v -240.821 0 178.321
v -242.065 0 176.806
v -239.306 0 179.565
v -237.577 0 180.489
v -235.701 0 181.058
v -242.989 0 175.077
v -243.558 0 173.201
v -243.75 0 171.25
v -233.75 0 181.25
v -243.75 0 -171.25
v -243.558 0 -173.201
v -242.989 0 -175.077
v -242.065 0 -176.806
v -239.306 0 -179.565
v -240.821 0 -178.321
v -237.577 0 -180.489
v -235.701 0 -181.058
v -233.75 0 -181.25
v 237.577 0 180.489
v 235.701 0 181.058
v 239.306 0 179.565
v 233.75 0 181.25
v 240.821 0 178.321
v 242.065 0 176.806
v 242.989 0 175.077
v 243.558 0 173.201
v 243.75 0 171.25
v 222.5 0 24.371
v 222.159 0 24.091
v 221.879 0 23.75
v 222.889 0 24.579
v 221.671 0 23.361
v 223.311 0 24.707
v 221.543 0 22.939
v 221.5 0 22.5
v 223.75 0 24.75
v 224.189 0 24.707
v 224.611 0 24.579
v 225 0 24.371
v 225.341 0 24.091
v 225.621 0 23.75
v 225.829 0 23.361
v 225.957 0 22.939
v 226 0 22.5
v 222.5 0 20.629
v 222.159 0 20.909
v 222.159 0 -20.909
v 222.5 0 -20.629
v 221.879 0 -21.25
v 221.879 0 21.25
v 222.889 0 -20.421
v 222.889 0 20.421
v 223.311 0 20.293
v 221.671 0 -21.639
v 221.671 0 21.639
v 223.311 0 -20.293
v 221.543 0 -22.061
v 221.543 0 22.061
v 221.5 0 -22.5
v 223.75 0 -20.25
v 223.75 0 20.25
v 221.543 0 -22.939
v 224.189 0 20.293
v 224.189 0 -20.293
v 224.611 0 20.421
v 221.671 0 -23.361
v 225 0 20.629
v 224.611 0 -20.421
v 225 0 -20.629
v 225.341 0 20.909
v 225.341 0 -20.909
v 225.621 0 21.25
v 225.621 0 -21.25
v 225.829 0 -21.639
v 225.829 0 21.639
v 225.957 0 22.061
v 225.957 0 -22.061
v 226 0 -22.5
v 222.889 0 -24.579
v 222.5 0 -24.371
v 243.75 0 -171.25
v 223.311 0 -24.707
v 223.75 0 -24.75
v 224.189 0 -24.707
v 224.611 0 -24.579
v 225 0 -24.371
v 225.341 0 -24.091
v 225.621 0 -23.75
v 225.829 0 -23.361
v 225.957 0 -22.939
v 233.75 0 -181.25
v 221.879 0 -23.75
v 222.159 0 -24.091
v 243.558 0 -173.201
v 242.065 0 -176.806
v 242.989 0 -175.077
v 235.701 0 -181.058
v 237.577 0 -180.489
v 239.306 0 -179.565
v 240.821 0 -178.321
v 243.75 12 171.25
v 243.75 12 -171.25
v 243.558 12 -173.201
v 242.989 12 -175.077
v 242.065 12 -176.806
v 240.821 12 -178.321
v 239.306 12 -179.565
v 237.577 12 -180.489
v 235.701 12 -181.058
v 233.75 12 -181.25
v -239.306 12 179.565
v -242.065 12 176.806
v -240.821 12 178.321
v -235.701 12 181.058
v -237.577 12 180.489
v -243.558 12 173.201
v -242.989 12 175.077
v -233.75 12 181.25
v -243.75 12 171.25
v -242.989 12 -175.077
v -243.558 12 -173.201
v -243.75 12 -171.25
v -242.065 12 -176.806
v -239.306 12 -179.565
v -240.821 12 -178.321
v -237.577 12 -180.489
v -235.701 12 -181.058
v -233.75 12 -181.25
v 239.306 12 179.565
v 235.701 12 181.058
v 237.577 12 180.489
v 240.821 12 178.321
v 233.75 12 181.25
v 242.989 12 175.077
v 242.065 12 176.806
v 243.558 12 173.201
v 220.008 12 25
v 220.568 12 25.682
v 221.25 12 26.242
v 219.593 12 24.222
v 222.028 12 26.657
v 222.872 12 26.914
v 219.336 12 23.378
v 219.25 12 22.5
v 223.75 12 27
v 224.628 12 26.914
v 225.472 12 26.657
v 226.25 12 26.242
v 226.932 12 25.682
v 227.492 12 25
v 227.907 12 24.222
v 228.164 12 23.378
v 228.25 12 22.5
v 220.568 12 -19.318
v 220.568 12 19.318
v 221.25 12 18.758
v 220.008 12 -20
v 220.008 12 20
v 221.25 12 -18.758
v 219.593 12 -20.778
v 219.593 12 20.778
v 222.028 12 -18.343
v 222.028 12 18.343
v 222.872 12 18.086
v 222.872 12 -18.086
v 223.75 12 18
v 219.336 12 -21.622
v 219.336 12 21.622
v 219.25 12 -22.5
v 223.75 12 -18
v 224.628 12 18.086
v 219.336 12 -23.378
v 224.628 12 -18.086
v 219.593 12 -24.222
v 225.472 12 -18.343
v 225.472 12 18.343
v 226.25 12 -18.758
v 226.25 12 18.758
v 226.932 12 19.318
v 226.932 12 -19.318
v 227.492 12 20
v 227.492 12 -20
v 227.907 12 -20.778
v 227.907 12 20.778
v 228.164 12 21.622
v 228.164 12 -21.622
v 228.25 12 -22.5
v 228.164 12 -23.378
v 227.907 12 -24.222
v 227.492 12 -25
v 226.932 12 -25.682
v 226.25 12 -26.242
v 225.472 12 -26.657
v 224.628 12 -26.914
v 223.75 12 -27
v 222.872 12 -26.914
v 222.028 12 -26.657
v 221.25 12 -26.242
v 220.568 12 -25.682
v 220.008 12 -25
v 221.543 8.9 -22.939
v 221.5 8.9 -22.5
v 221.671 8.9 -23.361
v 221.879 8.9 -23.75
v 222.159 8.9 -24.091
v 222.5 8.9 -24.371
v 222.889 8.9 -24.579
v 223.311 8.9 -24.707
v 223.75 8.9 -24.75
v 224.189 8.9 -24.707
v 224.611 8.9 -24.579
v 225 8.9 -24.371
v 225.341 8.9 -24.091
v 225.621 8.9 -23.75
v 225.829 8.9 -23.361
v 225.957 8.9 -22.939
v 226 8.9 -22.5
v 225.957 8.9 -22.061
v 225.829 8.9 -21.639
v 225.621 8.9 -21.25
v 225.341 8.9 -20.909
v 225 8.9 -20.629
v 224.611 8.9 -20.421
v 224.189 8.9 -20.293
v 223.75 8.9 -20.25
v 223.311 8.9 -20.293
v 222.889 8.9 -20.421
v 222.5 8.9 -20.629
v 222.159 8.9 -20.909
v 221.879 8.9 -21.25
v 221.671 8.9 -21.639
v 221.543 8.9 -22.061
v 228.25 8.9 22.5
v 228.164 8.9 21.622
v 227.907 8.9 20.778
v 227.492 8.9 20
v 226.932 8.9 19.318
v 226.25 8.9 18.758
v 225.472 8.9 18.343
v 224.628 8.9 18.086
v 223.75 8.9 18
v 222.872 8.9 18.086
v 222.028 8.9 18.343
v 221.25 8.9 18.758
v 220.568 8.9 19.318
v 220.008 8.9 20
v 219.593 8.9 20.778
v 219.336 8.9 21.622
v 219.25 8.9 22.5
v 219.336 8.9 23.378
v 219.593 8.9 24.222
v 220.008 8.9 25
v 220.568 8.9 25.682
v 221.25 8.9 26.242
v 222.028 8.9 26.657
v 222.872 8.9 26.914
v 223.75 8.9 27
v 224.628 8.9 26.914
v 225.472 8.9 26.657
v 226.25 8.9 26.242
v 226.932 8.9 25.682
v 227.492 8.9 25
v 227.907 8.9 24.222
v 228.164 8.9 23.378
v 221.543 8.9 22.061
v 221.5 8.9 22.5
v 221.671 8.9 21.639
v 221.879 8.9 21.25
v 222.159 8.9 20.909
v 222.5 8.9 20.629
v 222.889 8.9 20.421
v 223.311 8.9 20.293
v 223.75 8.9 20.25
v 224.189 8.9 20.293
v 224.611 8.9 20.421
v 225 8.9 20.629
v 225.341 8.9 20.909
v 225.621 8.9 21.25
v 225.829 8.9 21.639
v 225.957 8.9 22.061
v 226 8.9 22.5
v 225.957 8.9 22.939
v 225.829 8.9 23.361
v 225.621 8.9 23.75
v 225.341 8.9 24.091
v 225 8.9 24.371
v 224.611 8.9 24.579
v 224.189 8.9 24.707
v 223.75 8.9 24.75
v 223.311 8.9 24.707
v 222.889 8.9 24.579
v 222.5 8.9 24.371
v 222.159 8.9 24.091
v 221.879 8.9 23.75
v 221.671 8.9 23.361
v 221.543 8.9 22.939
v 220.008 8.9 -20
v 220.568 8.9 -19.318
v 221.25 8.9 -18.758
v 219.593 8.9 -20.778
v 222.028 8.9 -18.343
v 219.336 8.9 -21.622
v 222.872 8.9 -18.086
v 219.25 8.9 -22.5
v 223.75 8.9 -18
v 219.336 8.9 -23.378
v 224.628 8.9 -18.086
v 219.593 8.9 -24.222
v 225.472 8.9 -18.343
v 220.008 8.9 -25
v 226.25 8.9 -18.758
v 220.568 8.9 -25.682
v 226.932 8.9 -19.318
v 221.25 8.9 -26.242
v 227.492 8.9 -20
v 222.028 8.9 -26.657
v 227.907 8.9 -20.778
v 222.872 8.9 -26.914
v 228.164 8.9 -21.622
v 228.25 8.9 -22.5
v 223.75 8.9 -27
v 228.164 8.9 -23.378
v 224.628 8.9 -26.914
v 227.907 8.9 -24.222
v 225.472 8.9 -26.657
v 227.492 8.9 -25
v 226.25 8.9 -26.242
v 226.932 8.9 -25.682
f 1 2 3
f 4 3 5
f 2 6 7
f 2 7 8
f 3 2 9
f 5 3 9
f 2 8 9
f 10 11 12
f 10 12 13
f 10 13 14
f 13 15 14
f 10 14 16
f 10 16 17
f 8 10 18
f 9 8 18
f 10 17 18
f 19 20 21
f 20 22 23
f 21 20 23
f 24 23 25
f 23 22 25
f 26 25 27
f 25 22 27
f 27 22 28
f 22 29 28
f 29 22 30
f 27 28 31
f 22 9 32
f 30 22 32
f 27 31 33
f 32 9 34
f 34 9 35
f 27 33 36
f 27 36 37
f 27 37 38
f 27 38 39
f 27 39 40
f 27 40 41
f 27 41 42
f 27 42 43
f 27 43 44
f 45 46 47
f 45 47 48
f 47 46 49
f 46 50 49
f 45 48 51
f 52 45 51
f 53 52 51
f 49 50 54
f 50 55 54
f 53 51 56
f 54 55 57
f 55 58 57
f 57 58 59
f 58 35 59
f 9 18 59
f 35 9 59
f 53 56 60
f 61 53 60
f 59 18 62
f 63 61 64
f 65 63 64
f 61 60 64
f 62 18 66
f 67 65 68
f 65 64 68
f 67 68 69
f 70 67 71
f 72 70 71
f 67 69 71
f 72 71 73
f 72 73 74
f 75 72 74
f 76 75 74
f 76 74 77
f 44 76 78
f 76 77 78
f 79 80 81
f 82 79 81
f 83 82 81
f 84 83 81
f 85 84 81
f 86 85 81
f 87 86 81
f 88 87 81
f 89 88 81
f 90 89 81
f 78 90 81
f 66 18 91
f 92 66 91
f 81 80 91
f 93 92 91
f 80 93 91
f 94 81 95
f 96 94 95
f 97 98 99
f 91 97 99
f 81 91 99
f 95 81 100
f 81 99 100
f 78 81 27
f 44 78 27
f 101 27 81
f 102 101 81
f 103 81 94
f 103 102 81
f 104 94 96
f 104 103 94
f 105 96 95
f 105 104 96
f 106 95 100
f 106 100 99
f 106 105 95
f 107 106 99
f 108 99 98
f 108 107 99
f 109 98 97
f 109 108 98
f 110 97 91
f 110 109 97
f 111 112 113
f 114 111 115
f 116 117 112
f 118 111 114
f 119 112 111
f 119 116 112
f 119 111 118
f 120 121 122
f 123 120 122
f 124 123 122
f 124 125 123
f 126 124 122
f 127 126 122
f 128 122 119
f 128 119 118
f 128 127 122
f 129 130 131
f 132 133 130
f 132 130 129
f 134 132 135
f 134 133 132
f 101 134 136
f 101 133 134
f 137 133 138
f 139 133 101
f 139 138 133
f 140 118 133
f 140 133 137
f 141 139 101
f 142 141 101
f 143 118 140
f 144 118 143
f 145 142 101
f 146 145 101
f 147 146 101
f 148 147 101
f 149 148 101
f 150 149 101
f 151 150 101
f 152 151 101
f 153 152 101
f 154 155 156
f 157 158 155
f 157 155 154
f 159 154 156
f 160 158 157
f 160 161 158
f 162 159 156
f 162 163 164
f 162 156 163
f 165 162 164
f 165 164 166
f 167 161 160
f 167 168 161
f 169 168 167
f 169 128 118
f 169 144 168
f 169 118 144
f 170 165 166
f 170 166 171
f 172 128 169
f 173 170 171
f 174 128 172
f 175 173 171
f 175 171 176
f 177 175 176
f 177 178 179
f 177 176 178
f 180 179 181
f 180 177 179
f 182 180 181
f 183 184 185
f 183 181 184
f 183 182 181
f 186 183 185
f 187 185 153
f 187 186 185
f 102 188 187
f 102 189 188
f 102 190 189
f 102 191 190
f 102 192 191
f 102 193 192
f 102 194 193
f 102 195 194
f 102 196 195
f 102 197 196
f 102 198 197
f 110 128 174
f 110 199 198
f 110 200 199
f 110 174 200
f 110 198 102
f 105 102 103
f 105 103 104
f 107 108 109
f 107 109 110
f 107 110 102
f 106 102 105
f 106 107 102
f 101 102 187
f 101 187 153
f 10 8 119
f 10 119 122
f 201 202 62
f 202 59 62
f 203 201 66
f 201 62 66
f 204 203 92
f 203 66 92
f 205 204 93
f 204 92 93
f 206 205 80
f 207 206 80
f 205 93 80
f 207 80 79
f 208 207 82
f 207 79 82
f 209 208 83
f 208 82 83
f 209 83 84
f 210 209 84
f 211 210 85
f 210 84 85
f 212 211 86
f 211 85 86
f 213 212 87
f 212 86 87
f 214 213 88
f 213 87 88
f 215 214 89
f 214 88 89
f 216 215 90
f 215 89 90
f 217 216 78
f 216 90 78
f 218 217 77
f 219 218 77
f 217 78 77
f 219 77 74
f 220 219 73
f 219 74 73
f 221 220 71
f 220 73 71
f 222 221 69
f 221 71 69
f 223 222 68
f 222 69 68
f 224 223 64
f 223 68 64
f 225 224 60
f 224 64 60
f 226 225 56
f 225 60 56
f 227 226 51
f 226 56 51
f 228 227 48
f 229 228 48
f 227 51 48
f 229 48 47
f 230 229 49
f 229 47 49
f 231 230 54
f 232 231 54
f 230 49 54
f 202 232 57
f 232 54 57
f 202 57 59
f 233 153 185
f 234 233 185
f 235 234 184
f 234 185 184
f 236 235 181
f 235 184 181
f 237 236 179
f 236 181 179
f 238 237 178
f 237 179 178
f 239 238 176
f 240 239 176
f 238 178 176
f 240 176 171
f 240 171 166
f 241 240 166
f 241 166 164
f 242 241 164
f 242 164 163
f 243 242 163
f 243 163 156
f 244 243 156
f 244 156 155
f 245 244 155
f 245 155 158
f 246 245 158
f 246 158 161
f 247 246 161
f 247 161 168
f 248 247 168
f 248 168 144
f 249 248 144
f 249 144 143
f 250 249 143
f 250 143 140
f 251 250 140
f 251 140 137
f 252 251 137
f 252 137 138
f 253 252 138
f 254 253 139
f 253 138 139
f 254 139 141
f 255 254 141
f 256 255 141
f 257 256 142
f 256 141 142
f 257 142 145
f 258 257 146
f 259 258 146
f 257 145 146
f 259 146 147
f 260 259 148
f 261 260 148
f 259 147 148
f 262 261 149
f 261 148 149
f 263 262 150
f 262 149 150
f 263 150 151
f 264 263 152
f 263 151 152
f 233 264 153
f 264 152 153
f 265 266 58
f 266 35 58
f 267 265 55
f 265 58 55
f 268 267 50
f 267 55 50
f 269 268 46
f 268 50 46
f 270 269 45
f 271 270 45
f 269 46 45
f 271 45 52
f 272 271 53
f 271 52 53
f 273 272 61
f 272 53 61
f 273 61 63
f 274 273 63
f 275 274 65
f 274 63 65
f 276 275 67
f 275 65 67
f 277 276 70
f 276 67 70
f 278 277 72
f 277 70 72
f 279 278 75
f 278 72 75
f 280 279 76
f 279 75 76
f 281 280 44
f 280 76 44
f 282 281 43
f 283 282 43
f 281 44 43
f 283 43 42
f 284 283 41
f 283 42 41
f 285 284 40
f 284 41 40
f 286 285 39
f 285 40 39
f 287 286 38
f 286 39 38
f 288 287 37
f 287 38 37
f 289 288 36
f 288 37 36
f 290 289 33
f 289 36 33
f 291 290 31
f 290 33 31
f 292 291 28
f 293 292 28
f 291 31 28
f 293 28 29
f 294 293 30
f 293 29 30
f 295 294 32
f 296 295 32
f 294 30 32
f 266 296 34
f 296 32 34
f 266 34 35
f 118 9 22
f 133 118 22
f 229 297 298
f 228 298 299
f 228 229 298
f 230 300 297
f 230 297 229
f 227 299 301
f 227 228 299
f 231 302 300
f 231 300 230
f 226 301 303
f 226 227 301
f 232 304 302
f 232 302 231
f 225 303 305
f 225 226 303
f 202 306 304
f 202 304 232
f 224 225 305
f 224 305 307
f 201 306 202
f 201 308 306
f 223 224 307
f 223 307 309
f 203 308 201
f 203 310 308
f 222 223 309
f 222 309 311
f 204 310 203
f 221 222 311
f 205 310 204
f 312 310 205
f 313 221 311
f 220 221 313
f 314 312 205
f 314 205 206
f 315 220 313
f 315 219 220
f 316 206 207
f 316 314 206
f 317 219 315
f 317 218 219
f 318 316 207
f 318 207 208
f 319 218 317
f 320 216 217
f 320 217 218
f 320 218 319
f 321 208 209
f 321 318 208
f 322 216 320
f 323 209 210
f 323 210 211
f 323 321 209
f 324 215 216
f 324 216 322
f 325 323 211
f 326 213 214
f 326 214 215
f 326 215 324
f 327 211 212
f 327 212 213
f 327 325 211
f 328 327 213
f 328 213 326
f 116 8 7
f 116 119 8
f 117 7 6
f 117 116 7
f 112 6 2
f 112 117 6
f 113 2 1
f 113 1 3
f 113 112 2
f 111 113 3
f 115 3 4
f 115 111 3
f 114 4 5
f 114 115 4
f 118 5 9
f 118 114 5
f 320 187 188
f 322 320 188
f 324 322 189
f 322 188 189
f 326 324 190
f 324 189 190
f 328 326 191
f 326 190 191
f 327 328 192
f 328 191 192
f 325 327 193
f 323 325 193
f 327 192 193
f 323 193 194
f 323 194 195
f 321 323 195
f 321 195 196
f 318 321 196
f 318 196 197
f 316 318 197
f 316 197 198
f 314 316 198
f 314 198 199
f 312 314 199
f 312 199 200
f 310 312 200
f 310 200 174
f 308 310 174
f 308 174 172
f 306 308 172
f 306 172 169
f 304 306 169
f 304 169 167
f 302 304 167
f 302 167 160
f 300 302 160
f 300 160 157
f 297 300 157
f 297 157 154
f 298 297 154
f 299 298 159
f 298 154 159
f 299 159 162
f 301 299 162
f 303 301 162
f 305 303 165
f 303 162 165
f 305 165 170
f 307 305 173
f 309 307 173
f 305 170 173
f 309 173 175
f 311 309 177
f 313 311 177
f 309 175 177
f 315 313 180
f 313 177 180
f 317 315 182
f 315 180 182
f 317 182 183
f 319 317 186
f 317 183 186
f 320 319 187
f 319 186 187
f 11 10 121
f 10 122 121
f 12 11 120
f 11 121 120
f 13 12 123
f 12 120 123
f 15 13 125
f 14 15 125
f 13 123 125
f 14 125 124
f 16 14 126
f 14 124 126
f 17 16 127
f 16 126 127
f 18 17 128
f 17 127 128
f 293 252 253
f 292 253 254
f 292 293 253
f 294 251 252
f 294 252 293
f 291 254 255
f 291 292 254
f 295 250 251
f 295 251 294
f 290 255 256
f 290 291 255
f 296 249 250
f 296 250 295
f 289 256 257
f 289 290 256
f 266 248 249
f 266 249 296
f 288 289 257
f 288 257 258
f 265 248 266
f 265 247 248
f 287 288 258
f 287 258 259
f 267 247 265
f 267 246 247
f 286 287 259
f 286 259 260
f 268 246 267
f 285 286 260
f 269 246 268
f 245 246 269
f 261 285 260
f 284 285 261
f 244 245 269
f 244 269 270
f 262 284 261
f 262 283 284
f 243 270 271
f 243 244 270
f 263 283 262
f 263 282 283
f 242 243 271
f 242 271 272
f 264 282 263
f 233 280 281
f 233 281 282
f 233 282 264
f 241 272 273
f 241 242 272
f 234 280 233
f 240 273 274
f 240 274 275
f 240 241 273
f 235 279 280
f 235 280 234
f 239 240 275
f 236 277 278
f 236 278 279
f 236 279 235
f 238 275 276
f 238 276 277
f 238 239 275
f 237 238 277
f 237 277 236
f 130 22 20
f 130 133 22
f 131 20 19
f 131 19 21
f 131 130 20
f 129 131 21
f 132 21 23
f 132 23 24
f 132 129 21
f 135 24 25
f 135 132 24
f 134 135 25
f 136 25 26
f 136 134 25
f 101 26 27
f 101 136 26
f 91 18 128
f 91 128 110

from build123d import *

# Parameters (mm, degrees)
SKETCH1_W                                        = 487.5
SKETCH1_H                                        = 362.5
BOSS_EXTRUDE1_DEPTH                              = 12
FILLET1_R                                        = 10
CBORE_FOR_M4_PAN_HEAD_MACHINE_SCREW1_D           = 4.5
CBORE_FOR_M4_PAN_HEAD_MACHINE_SCREW1_CBORE_D     = 9
CBORE_FOR_M4_PAN_HEAD_MACHINE_SCREW1_CBORE_DEPTH = 3.1


with BuildPart() as part:
    # Sketch1 → Boss-Extrude1 (new body)
    with BuildSketch(Plane(origin=(0, 0, 0), x_dir=(1, 0, 0), z_dir=(0, 1, 0))):
        Rectangle(SKETCH1_W, SKETCH1_H)
    extrude(amount=BOSS_EXTRUDE1_DEPTH)

    # Fillet1
    fillet1_edges = [part.edges().sort_by_distance(p)[0] for p in [
        (243.75, 6, 181.25),
        (-243.75, 6, 181.25),
        (-243.75, 6, -181.25),
        (243.75, 6, -181.25),
    ]]
    fillet(fillet1_edges, radius=FILLET1_R)

    # CBORE for M4 Pan Head Machine Screw1 (through all)
    with Locations(Plane(origin=(0, 12, 0), x_dir=(1, 0, 0), z_dir=(0, 1, 0))):
        with Locations((223.75, -22.5), (223.75, 22.5)):
            CounterBoreHole(CBORE_FOR_M4_PAN_HEAD_MACHINE_SCREW1_D / 2, CBORE_FOR_M4_PAN_HEAD_MACHINE_SCREW1_CBORE_D / 2, CBORE_FOR_M4_PAN_HEAD_MACHINE_SCREW1_CBORE_DEPTH)


solid = part.part
